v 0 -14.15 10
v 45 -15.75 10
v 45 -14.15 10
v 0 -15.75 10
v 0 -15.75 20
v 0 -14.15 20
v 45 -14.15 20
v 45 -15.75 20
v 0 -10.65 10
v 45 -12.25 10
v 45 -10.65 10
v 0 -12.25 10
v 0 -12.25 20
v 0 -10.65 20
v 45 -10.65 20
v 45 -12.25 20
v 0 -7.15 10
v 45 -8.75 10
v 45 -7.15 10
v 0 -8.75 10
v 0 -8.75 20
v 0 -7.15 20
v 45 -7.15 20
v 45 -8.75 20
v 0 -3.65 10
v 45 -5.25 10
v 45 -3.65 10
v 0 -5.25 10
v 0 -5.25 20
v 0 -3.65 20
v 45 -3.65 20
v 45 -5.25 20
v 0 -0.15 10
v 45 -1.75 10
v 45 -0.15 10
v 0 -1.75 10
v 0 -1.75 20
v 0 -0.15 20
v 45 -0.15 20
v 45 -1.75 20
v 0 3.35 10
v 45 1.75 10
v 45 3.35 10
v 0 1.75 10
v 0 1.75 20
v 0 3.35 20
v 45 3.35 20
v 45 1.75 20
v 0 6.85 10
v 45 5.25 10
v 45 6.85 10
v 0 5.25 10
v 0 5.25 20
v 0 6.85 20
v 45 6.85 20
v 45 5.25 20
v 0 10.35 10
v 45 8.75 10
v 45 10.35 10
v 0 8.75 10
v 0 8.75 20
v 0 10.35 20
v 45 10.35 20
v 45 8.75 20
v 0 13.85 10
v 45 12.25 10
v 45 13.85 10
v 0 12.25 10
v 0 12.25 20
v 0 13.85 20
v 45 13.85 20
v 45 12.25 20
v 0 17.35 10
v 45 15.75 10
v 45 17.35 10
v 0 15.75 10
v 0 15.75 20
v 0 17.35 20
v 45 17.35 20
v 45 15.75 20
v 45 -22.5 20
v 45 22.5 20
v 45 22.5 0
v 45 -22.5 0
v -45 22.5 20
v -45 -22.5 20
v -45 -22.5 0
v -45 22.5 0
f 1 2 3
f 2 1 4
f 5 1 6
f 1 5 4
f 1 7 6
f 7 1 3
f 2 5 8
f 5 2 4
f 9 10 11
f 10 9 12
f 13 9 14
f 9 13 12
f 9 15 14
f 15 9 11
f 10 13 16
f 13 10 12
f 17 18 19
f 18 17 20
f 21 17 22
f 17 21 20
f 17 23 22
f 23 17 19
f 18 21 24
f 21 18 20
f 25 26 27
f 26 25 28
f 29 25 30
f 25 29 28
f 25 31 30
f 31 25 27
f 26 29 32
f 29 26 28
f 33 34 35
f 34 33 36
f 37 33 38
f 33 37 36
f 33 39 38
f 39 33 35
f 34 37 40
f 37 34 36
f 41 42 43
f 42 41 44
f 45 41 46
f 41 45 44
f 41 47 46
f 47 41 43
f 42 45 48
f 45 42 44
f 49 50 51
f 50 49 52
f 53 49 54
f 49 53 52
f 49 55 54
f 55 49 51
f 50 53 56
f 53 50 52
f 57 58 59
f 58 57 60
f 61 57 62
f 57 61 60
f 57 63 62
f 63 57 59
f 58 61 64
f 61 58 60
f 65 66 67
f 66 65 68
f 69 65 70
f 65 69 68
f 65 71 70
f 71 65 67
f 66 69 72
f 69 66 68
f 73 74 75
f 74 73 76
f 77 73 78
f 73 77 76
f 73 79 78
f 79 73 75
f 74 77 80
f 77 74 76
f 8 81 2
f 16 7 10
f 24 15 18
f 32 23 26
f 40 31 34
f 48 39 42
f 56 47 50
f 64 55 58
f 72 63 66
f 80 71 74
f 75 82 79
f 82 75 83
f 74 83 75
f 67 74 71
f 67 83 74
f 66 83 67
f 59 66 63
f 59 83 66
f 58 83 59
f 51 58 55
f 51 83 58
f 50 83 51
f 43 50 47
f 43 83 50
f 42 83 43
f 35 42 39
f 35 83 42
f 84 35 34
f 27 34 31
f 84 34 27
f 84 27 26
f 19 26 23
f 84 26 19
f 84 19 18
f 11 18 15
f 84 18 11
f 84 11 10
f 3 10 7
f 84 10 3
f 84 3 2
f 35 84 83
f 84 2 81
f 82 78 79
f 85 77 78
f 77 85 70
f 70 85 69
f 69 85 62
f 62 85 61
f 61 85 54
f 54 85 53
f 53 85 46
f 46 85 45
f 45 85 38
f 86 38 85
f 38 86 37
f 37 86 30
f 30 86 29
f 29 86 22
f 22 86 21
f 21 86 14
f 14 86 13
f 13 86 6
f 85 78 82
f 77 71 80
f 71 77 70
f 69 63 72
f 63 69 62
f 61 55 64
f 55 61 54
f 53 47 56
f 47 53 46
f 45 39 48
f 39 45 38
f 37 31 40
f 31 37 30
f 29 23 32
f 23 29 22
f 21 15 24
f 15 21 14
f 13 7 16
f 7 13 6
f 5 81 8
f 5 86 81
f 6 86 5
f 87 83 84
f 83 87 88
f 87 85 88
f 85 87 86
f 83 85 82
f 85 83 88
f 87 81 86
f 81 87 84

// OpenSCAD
// Slide drying rack - holds 10 microscope slides standing upright on their long edge
// Print orientation: base block on the bed, slots open upward (+Z)

// ---------------- Parameters ----------------
base_len    = 90;    // block length along X (mm)
base_wid    = 45;    // block width along Y (mm)
base_ht     = 20;    // block height along Z (mm)

slot_len    = 77;    // slot length along X (mm)
slot_wid    = 1.6;   // slot width along Y (mm)
slot_depth  = 10;    // slot depth from top face (mm)

slot_count  = 10;    // number of slots
slot_pitch  = 3.5;   // centre-to-centre spacing of slots in Y (mm)

eps         = 0.5;   // overcut so cutters pass through the top face (mm)

// Derived
first_y = -(slot_count - 1) * slot_pitch / 2;  // Y of first slot, groups centred on block

// ---------------- Model ----------------
difference() {
    // Base block, centred in X/Y, sitting on z = 0
    translate([-base_len / 2, -base_wid / 2, 0])
        cube([base_len, base_wid, base_ht]);

    // Slots, open at the top
    for (i = [0 : slot_count - 1]) {
        translate([0, first_y + i * slot_pitch, base_ht - slot_depth])
            cube([slot_len, slot_wid, slot_depth + eps]);
    }
}
